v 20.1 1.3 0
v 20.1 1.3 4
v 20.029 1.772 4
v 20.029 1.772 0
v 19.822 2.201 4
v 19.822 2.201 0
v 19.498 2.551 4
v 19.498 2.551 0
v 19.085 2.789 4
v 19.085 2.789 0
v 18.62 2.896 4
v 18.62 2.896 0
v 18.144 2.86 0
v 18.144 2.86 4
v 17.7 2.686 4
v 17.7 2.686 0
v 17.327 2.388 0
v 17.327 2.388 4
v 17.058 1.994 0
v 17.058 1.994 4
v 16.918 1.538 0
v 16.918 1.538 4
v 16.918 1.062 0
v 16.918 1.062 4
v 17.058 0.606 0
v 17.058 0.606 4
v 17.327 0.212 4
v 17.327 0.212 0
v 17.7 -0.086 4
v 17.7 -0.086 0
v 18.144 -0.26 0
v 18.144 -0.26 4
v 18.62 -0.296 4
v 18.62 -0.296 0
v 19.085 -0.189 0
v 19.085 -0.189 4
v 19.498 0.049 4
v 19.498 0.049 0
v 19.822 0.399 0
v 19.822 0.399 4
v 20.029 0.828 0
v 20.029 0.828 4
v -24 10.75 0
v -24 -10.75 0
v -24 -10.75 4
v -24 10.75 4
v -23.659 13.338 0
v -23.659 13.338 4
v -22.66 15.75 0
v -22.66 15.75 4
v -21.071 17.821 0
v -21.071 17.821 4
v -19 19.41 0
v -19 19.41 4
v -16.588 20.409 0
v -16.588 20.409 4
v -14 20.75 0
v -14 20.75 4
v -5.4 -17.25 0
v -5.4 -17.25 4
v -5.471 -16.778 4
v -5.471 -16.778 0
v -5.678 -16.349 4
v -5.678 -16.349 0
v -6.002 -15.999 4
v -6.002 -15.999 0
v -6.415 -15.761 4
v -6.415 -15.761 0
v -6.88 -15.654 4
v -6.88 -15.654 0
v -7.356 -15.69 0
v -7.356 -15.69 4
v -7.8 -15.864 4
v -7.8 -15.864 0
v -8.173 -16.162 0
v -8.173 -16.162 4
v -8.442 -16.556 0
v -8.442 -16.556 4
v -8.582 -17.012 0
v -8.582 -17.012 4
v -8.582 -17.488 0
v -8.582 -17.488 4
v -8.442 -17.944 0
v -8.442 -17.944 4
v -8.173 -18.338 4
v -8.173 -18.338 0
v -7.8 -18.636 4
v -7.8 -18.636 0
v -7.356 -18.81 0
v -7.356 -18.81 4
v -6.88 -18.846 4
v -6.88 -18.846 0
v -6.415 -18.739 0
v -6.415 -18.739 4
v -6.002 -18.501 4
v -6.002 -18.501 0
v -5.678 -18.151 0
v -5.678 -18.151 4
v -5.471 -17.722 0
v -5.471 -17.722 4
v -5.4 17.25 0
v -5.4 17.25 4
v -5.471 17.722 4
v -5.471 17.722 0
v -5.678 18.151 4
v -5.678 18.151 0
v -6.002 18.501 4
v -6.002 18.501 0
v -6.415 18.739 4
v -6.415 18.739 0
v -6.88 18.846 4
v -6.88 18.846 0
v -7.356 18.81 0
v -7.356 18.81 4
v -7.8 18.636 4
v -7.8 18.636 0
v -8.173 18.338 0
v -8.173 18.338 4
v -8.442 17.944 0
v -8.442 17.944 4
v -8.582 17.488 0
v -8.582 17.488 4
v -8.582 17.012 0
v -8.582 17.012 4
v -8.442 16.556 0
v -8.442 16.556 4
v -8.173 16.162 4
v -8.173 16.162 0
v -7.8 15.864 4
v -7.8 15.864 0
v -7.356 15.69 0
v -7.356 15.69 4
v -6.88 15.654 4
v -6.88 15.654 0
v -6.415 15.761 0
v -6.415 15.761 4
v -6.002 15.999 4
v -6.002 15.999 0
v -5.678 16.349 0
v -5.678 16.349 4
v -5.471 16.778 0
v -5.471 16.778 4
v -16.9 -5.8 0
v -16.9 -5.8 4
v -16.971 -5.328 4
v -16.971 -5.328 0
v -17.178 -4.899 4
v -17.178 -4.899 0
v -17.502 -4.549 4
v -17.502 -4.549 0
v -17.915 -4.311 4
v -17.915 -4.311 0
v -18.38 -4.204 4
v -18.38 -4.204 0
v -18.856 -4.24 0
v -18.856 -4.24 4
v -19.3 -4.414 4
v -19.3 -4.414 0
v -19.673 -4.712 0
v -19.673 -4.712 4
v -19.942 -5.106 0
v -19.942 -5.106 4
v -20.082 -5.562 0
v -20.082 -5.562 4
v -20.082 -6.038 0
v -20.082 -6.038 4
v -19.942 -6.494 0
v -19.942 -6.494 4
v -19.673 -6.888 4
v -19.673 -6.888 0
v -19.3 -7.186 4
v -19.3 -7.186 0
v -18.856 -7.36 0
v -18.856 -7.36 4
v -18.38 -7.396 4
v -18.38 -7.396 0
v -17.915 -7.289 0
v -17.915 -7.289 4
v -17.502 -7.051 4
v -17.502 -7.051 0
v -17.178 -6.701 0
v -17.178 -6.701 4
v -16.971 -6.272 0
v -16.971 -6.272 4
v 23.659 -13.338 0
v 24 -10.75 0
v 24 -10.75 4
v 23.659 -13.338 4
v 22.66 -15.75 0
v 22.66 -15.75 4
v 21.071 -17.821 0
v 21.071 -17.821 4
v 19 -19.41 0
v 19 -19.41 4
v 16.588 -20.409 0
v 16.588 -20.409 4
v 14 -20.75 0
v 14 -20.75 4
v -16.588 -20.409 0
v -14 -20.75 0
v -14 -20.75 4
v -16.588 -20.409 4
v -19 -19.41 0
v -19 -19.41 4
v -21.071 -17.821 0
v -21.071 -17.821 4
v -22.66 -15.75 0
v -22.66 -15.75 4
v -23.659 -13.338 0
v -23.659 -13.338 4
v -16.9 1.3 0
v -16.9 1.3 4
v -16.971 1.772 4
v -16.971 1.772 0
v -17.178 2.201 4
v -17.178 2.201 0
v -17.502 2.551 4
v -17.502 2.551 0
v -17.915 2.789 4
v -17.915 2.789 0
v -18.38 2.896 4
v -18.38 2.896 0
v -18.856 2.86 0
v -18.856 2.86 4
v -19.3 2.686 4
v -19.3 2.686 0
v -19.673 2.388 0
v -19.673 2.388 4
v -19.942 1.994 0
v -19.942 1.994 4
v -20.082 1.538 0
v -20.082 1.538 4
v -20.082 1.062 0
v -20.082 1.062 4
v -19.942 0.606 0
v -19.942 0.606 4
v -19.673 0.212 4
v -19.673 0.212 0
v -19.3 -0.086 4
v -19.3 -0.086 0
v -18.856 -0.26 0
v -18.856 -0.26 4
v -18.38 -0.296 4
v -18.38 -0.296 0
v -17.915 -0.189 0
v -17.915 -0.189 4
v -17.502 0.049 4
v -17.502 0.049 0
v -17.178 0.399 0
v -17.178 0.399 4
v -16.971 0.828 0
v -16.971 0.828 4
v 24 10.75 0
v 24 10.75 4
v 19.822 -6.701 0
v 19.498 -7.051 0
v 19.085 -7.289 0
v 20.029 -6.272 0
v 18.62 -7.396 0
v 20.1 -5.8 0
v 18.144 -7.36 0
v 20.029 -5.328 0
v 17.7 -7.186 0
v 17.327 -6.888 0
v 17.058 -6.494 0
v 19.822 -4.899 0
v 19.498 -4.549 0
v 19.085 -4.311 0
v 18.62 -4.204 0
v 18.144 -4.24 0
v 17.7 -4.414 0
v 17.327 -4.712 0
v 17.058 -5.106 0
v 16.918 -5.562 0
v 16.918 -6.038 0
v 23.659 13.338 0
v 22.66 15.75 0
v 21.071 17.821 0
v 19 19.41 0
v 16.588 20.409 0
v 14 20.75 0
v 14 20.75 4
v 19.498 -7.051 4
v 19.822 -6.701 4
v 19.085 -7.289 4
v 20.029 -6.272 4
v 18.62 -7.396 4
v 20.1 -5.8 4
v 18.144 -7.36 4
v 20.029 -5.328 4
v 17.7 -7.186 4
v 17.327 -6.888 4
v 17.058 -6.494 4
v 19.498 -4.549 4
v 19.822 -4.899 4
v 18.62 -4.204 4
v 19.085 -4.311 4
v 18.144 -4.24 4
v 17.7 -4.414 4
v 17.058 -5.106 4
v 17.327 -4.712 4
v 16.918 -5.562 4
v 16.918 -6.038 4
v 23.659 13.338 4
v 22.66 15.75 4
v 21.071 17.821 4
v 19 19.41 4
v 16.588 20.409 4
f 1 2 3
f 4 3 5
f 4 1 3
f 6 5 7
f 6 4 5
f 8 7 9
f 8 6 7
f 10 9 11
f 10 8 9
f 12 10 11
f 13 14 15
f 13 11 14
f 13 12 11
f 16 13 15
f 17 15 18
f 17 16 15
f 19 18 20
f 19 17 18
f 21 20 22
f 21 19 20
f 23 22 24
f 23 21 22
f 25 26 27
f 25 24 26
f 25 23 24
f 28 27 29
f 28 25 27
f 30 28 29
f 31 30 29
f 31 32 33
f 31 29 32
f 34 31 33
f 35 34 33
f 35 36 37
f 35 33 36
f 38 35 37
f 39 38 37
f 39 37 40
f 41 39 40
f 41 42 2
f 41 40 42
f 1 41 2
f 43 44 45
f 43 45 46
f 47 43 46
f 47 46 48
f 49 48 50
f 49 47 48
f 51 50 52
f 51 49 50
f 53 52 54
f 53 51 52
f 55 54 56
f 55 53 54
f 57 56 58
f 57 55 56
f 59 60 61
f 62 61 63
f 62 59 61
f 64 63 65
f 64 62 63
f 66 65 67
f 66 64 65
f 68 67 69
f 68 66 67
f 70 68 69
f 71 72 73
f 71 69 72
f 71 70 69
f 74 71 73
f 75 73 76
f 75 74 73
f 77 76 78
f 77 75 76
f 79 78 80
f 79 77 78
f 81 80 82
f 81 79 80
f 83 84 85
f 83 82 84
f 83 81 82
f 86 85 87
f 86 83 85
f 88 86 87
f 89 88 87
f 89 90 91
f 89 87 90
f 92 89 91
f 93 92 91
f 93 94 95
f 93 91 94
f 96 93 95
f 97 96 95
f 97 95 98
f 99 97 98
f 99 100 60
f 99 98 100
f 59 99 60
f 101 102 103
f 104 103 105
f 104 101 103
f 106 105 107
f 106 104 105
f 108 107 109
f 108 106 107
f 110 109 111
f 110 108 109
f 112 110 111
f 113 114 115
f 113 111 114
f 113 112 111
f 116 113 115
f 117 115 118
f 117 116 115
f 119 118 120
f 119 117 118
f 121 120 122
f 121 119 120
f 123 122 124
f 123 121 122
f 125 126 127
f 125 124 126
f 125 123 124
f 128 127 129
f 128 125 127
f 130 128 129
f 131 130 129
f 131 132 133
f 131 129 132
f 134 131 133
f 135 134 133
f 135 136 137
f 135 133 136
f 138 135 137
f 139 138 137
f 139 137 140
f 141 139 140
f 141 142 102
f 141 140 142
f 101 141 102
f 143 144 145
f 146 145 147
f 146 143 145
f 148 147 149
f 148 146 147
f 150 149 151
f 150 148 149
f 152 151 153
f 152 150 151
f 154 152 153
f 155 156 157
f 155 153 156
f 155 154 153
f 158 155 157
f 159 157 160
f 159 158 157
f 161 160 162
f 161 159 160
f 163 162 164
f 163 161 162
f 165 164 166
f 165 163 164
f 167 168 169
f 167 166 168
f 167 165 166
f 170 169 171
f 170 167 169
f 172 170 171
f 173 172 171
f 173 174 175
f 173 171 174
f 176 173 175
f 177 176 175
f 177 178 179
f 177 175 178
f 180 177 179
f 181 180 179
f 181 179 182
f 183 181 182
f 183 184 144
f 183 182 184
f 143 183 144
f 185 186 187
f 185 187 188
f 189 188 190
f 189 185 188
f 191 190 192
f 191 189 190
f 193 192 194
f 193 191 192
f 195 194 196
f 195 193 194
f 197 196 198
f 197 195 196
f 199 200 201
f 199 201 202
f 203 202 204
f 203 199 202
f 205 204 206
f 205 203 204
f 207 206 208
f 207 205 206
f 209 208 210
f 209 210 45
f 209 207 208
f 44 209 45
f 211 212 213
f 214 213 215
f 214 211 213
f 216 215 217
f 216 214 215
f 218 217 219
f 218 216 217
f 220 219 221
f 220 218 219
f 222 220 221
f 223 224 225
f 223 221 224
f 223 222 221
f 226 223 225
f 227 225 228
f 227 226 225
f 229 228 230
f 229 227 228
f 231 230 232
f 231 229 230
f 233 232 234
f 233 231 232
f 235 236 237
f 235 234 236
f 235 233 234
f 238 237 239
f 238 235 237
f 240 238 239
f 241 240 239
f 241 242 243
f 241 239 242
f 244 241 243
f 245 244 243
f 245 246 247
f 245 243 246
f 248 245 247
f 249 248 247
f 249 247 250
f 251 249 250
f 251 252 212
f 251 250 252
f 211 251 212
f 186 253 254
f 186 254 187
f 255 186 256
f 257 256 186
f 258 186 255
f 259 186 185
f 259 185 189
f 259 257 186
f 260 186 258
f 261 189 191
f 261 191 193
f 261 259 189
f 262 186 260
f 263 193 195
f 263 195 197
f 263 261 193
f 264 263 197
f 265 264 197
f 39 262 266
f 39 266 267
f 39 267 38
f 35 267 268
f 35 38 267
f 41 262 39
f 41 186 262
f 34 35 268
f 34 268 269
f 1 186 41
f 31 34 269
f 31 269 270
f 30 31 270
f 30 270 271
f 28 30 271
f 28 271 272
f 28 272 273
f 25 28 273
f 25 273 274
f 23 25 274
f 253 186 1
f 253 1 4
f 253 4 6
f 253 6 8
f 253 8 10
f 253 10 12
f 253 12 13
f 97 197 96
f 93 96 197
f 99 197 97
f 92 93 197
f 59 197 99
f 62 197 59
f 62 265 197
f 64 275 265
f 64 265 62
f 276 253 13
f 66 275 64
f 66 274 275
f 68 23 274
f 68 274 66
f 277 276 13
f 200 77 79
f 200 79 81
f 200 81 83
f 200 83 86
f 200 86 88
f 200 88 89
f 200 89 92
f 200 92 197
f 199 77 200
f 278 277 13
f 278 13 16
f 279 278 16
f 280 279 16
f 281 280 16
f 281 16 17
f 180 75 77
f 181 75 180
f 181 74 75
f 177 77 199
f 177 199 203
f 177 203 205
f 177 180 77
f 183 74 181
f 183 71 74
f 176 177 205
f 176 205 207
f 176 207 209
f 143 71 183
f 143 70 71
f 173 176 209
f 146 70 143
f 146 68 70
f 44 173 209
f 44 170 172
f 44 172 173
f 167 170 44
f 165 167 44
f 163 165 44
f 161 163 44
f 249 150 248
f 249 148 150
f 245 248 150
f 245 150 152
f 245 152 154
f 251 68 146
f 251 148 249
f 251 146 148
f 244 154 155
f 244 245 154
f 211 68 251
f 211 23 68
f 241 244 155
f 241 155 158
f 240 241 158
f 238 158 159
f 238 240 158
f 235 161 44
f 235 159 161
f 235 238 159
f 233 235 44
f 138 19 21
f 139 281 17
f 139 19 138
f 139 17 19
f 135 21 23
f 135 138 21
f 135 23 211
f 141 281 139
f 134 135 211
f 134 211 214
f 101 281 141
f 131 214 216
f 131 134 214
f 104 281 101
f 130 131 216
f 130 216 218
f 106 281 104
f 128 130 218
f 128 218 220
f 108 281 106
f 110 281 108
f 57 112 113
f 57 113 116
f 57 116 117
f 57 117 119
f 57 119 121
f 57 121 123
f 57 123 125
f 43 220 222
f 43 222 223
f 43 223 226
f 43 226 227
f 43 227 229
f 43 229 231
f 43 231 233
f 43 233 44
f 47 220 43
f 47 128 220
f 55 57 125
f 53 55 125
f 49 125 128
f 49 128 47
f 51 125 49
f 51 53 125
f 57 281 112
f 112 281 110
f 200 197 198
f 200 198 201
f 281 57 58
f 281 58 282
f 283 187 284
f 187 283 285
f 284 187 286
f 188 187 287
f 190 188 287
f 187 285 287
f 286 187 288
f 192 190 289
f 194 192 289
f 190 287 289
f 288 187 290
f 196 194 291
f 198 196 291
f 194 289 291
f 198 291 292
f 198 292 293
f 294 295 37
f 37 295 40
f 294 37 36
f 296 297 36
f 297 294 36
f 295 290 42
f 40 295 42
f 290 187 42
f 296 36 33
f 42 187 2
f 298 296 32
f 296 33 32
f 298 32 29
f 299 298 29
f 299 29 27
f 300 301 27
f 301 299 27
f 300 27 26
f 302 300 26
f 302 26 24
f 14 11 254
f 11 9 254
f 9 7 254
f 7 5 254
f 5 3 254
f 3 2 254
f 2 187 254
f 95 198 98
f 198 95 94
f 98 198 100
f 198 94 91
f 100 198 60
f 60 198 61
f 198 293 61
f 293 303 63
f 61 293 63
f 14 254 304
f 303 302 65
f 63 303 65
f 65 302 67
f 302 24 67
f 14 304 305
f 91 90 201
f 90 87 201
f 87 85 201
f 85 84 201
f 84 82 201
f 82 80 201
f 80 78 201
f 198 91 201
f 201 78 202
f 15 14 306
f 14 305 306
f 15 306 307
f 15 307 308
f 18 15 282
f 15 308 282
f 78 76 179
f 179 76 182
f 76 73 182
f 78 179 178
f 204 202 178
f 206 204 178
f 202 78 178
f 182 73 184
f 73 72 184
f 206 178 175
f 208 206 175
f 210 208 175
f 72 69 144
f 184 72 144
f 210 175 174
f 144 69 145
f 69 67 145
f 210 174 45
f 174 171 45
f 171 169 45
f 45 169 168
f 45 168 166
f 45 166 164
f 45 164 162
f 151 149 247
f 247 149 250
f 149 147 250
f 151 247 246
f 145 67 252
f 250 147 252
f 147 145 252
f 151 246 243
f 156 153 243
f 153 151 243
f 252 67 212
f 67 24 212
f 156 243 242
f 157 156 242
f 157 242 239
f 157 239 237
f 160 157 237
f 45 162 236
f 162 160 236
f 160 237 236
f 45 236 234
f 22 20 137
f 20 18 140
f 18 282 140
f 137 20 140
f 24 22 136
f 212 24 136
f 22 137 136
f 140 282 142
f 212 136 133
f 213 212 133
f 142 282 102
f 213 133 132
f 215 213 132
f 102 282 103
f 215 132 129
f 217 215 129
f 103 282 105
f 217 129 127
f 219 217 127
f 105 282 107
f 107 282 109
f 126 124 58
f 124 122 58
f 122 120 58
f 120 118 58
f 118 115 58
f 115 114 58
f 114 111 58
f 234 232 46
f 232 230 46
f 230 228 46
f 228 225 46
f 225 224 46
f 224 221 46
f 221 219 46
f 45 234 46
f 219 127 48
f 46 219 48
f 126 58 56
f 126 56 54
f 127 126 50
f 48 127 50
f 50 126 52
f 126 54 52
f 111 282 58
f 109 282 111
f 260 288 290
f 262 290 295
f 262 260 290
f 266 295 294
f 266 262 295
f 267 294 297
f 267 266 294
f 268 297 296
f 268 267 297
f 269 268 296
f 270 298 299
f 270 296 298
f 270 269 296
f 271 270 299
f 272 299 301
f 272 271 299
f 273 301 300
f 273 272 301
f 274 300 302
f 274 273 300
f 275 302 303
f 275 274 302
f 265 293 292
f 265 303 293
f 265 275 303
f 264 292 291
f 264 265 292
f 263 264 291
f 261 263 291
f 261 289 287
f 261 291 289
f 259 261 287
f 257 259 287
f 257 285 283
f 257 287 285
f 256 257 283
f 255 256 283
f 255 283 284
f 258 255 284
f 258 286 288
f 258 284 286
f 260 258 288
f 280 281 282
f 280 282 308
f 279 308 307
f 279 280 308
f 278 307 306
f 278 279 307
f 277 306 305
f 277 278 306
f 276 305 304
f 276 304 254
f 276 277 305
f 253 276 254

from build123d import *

# Parameters (mm, degrees)
BOSS_EXTRUDE1_DEPTH = 4
CUT_EXTRUDE1_REACH  = 33.978
SKETCH2_R           = 1.6


with BuildPart() as part:
    # Sketch1 → Boss-Extrude1 (new body)
    with BuildSketch(Plane.XY):
        with BuildLine():
            Line((-14, 20.75), (14, 20.75))
            ThreePointArc((14, 20.75), (21.071067812, 17.821067812), (24, 10.75))
            Line((24, 10.75), (24, -10.75))
            ThreePointArc((24, -10.75), (21.071067812, -17.821067812), (14, -20.75))
            Line((14, -20.75), (-14, -20.75))
            ThreePointArc((-14, -20.75), (-21.071067812, -17.821067812), (-24, -10.75))
            Line((-24, -10.75), (-24, 10.75))
            ThreePointArc((-24, 10.75), (-21.071067812, 17.821067812), (-14, 20.75))
        make_face()
    extrude(amount=BOSS_EXTRUDE1_DEPTH)

    # Sketch2 → Cut-Extrude1 (cut, up to next)
    with BuildSketch(Plane.XY, mode=Mode.PRIVATE) as cut_extrude1_sk1:
        with Locations((-7, -17.25)):
            Circle(SKETCH2_R)
    cut_extrude1_tool1 = extrude(cut_extrude1_sk1.sketch, amount=CUT_EXTRUDE1_REACH, mode=Mode.PRIVATE) & part.part
    # Sketch2 → Cut-Extrude1 (cut, up to next)
    with BuildSketch(Plane.XY, mode=Mode.PRIVATE) as cut_extrude1_sk2:
        with Locations((-7, 17.25)):
            Circle(SKETCH2_R)
    cut_extrude1_tool2 = extrude(cut_extrude1_sk2.sketch, amount=CUT_EXTRUDE1_REACH, mode=Mode.PRIVATE) & part.part
    # Sketch2 → Cut-Extrude1 (cut, up to next)
    with BuildSketch(Plane.XY, mode=Mode.PRIVATE) as cut_extrude1_sk3:
        with Locations((18.5, -5.8)):
            Circle(SKETCH2_R)
    cut_extrude1_tool3 = extrude(cut_extrude1_sk3.sketch, amount=CUT_EXTRUDE1_REACH, mode=Mode.PRIVATE) & part.part
    # Sketch2 → Cut-Extrude1 (cut, up to next)
    with BuildSketch(Plane.XY, mode=Mode.PRIVATE) as cut_extrude1_sk4:
        with Locations((18.5, 1.3)):
            Circle(SKETCH2_R)
    cut_extrude1_tool4 = extrude(cut_extrude1_sk4.sketch, amount=CUT_EXTRUDE1_REACH, mode=Mode.PRIVATE) & part.part
    # Sketch2 → Cut-Extrude1 (cut, up to next)
    with BuildSketch(Plane.XY, mode=Mode.PRIVATE) as cut_extrude1_sk5:
        with Locations((-18.5, -5.8)):
            Circle(SKETCH2_R)
    cut_extrude1_tool5 = extrude(cut_extrude1_sk5.sketch, amount=CUT_EXTRUDE1_REACH, mode=Mode.PRIVATE) & part.part
    # Sketch2 → Cut-Extrude1 (cut, up to next)
    with BuildSketch(Plane.XY, mode=Mode.PRIVATE) as cut_extrude1_sk6:
        with Locations((-18.5, 1.3)):
            Circle(SKETCH2_R)
    cut_extrude1_tool6 = extrude(cut_extrude1_sk6.sketch, amount=CUT_EXTRUDE1_REACH, mode=Mode.PRIVATE) & part.part
    add(cut_extrude1_tool1.solids().sort_by_distance((-7, -17.25, 0))[0], mode=Mode.SUBTRACT)
    add(cut_extrude1_tool2.solids().sort_by_distance((-7, 17.25, 0))[0], mode=Mode.SUBTRACT)
    add(cut_extrude1_tool3.solids().sort_by_distance((18.5, -5.8, 0))[0], mode=Mode.SUBTRACT)
    add(cut_extrude1_tool4.solids().sort_by_distance((18.5, 1.3, 0))[0], mode=Mode.SUBTRACT)
    add(cut_extrude1_tool5.solids().sort_by_distance((-18.5, -5.8, 0))[0], mode=Mode.SUBTRACT)
    add(cut_extrude1_tool6.solids().sort_by_distance((-18.5, 1.3, 0))[0], mode=Mode.SUBTRACT)


solid = part.part
